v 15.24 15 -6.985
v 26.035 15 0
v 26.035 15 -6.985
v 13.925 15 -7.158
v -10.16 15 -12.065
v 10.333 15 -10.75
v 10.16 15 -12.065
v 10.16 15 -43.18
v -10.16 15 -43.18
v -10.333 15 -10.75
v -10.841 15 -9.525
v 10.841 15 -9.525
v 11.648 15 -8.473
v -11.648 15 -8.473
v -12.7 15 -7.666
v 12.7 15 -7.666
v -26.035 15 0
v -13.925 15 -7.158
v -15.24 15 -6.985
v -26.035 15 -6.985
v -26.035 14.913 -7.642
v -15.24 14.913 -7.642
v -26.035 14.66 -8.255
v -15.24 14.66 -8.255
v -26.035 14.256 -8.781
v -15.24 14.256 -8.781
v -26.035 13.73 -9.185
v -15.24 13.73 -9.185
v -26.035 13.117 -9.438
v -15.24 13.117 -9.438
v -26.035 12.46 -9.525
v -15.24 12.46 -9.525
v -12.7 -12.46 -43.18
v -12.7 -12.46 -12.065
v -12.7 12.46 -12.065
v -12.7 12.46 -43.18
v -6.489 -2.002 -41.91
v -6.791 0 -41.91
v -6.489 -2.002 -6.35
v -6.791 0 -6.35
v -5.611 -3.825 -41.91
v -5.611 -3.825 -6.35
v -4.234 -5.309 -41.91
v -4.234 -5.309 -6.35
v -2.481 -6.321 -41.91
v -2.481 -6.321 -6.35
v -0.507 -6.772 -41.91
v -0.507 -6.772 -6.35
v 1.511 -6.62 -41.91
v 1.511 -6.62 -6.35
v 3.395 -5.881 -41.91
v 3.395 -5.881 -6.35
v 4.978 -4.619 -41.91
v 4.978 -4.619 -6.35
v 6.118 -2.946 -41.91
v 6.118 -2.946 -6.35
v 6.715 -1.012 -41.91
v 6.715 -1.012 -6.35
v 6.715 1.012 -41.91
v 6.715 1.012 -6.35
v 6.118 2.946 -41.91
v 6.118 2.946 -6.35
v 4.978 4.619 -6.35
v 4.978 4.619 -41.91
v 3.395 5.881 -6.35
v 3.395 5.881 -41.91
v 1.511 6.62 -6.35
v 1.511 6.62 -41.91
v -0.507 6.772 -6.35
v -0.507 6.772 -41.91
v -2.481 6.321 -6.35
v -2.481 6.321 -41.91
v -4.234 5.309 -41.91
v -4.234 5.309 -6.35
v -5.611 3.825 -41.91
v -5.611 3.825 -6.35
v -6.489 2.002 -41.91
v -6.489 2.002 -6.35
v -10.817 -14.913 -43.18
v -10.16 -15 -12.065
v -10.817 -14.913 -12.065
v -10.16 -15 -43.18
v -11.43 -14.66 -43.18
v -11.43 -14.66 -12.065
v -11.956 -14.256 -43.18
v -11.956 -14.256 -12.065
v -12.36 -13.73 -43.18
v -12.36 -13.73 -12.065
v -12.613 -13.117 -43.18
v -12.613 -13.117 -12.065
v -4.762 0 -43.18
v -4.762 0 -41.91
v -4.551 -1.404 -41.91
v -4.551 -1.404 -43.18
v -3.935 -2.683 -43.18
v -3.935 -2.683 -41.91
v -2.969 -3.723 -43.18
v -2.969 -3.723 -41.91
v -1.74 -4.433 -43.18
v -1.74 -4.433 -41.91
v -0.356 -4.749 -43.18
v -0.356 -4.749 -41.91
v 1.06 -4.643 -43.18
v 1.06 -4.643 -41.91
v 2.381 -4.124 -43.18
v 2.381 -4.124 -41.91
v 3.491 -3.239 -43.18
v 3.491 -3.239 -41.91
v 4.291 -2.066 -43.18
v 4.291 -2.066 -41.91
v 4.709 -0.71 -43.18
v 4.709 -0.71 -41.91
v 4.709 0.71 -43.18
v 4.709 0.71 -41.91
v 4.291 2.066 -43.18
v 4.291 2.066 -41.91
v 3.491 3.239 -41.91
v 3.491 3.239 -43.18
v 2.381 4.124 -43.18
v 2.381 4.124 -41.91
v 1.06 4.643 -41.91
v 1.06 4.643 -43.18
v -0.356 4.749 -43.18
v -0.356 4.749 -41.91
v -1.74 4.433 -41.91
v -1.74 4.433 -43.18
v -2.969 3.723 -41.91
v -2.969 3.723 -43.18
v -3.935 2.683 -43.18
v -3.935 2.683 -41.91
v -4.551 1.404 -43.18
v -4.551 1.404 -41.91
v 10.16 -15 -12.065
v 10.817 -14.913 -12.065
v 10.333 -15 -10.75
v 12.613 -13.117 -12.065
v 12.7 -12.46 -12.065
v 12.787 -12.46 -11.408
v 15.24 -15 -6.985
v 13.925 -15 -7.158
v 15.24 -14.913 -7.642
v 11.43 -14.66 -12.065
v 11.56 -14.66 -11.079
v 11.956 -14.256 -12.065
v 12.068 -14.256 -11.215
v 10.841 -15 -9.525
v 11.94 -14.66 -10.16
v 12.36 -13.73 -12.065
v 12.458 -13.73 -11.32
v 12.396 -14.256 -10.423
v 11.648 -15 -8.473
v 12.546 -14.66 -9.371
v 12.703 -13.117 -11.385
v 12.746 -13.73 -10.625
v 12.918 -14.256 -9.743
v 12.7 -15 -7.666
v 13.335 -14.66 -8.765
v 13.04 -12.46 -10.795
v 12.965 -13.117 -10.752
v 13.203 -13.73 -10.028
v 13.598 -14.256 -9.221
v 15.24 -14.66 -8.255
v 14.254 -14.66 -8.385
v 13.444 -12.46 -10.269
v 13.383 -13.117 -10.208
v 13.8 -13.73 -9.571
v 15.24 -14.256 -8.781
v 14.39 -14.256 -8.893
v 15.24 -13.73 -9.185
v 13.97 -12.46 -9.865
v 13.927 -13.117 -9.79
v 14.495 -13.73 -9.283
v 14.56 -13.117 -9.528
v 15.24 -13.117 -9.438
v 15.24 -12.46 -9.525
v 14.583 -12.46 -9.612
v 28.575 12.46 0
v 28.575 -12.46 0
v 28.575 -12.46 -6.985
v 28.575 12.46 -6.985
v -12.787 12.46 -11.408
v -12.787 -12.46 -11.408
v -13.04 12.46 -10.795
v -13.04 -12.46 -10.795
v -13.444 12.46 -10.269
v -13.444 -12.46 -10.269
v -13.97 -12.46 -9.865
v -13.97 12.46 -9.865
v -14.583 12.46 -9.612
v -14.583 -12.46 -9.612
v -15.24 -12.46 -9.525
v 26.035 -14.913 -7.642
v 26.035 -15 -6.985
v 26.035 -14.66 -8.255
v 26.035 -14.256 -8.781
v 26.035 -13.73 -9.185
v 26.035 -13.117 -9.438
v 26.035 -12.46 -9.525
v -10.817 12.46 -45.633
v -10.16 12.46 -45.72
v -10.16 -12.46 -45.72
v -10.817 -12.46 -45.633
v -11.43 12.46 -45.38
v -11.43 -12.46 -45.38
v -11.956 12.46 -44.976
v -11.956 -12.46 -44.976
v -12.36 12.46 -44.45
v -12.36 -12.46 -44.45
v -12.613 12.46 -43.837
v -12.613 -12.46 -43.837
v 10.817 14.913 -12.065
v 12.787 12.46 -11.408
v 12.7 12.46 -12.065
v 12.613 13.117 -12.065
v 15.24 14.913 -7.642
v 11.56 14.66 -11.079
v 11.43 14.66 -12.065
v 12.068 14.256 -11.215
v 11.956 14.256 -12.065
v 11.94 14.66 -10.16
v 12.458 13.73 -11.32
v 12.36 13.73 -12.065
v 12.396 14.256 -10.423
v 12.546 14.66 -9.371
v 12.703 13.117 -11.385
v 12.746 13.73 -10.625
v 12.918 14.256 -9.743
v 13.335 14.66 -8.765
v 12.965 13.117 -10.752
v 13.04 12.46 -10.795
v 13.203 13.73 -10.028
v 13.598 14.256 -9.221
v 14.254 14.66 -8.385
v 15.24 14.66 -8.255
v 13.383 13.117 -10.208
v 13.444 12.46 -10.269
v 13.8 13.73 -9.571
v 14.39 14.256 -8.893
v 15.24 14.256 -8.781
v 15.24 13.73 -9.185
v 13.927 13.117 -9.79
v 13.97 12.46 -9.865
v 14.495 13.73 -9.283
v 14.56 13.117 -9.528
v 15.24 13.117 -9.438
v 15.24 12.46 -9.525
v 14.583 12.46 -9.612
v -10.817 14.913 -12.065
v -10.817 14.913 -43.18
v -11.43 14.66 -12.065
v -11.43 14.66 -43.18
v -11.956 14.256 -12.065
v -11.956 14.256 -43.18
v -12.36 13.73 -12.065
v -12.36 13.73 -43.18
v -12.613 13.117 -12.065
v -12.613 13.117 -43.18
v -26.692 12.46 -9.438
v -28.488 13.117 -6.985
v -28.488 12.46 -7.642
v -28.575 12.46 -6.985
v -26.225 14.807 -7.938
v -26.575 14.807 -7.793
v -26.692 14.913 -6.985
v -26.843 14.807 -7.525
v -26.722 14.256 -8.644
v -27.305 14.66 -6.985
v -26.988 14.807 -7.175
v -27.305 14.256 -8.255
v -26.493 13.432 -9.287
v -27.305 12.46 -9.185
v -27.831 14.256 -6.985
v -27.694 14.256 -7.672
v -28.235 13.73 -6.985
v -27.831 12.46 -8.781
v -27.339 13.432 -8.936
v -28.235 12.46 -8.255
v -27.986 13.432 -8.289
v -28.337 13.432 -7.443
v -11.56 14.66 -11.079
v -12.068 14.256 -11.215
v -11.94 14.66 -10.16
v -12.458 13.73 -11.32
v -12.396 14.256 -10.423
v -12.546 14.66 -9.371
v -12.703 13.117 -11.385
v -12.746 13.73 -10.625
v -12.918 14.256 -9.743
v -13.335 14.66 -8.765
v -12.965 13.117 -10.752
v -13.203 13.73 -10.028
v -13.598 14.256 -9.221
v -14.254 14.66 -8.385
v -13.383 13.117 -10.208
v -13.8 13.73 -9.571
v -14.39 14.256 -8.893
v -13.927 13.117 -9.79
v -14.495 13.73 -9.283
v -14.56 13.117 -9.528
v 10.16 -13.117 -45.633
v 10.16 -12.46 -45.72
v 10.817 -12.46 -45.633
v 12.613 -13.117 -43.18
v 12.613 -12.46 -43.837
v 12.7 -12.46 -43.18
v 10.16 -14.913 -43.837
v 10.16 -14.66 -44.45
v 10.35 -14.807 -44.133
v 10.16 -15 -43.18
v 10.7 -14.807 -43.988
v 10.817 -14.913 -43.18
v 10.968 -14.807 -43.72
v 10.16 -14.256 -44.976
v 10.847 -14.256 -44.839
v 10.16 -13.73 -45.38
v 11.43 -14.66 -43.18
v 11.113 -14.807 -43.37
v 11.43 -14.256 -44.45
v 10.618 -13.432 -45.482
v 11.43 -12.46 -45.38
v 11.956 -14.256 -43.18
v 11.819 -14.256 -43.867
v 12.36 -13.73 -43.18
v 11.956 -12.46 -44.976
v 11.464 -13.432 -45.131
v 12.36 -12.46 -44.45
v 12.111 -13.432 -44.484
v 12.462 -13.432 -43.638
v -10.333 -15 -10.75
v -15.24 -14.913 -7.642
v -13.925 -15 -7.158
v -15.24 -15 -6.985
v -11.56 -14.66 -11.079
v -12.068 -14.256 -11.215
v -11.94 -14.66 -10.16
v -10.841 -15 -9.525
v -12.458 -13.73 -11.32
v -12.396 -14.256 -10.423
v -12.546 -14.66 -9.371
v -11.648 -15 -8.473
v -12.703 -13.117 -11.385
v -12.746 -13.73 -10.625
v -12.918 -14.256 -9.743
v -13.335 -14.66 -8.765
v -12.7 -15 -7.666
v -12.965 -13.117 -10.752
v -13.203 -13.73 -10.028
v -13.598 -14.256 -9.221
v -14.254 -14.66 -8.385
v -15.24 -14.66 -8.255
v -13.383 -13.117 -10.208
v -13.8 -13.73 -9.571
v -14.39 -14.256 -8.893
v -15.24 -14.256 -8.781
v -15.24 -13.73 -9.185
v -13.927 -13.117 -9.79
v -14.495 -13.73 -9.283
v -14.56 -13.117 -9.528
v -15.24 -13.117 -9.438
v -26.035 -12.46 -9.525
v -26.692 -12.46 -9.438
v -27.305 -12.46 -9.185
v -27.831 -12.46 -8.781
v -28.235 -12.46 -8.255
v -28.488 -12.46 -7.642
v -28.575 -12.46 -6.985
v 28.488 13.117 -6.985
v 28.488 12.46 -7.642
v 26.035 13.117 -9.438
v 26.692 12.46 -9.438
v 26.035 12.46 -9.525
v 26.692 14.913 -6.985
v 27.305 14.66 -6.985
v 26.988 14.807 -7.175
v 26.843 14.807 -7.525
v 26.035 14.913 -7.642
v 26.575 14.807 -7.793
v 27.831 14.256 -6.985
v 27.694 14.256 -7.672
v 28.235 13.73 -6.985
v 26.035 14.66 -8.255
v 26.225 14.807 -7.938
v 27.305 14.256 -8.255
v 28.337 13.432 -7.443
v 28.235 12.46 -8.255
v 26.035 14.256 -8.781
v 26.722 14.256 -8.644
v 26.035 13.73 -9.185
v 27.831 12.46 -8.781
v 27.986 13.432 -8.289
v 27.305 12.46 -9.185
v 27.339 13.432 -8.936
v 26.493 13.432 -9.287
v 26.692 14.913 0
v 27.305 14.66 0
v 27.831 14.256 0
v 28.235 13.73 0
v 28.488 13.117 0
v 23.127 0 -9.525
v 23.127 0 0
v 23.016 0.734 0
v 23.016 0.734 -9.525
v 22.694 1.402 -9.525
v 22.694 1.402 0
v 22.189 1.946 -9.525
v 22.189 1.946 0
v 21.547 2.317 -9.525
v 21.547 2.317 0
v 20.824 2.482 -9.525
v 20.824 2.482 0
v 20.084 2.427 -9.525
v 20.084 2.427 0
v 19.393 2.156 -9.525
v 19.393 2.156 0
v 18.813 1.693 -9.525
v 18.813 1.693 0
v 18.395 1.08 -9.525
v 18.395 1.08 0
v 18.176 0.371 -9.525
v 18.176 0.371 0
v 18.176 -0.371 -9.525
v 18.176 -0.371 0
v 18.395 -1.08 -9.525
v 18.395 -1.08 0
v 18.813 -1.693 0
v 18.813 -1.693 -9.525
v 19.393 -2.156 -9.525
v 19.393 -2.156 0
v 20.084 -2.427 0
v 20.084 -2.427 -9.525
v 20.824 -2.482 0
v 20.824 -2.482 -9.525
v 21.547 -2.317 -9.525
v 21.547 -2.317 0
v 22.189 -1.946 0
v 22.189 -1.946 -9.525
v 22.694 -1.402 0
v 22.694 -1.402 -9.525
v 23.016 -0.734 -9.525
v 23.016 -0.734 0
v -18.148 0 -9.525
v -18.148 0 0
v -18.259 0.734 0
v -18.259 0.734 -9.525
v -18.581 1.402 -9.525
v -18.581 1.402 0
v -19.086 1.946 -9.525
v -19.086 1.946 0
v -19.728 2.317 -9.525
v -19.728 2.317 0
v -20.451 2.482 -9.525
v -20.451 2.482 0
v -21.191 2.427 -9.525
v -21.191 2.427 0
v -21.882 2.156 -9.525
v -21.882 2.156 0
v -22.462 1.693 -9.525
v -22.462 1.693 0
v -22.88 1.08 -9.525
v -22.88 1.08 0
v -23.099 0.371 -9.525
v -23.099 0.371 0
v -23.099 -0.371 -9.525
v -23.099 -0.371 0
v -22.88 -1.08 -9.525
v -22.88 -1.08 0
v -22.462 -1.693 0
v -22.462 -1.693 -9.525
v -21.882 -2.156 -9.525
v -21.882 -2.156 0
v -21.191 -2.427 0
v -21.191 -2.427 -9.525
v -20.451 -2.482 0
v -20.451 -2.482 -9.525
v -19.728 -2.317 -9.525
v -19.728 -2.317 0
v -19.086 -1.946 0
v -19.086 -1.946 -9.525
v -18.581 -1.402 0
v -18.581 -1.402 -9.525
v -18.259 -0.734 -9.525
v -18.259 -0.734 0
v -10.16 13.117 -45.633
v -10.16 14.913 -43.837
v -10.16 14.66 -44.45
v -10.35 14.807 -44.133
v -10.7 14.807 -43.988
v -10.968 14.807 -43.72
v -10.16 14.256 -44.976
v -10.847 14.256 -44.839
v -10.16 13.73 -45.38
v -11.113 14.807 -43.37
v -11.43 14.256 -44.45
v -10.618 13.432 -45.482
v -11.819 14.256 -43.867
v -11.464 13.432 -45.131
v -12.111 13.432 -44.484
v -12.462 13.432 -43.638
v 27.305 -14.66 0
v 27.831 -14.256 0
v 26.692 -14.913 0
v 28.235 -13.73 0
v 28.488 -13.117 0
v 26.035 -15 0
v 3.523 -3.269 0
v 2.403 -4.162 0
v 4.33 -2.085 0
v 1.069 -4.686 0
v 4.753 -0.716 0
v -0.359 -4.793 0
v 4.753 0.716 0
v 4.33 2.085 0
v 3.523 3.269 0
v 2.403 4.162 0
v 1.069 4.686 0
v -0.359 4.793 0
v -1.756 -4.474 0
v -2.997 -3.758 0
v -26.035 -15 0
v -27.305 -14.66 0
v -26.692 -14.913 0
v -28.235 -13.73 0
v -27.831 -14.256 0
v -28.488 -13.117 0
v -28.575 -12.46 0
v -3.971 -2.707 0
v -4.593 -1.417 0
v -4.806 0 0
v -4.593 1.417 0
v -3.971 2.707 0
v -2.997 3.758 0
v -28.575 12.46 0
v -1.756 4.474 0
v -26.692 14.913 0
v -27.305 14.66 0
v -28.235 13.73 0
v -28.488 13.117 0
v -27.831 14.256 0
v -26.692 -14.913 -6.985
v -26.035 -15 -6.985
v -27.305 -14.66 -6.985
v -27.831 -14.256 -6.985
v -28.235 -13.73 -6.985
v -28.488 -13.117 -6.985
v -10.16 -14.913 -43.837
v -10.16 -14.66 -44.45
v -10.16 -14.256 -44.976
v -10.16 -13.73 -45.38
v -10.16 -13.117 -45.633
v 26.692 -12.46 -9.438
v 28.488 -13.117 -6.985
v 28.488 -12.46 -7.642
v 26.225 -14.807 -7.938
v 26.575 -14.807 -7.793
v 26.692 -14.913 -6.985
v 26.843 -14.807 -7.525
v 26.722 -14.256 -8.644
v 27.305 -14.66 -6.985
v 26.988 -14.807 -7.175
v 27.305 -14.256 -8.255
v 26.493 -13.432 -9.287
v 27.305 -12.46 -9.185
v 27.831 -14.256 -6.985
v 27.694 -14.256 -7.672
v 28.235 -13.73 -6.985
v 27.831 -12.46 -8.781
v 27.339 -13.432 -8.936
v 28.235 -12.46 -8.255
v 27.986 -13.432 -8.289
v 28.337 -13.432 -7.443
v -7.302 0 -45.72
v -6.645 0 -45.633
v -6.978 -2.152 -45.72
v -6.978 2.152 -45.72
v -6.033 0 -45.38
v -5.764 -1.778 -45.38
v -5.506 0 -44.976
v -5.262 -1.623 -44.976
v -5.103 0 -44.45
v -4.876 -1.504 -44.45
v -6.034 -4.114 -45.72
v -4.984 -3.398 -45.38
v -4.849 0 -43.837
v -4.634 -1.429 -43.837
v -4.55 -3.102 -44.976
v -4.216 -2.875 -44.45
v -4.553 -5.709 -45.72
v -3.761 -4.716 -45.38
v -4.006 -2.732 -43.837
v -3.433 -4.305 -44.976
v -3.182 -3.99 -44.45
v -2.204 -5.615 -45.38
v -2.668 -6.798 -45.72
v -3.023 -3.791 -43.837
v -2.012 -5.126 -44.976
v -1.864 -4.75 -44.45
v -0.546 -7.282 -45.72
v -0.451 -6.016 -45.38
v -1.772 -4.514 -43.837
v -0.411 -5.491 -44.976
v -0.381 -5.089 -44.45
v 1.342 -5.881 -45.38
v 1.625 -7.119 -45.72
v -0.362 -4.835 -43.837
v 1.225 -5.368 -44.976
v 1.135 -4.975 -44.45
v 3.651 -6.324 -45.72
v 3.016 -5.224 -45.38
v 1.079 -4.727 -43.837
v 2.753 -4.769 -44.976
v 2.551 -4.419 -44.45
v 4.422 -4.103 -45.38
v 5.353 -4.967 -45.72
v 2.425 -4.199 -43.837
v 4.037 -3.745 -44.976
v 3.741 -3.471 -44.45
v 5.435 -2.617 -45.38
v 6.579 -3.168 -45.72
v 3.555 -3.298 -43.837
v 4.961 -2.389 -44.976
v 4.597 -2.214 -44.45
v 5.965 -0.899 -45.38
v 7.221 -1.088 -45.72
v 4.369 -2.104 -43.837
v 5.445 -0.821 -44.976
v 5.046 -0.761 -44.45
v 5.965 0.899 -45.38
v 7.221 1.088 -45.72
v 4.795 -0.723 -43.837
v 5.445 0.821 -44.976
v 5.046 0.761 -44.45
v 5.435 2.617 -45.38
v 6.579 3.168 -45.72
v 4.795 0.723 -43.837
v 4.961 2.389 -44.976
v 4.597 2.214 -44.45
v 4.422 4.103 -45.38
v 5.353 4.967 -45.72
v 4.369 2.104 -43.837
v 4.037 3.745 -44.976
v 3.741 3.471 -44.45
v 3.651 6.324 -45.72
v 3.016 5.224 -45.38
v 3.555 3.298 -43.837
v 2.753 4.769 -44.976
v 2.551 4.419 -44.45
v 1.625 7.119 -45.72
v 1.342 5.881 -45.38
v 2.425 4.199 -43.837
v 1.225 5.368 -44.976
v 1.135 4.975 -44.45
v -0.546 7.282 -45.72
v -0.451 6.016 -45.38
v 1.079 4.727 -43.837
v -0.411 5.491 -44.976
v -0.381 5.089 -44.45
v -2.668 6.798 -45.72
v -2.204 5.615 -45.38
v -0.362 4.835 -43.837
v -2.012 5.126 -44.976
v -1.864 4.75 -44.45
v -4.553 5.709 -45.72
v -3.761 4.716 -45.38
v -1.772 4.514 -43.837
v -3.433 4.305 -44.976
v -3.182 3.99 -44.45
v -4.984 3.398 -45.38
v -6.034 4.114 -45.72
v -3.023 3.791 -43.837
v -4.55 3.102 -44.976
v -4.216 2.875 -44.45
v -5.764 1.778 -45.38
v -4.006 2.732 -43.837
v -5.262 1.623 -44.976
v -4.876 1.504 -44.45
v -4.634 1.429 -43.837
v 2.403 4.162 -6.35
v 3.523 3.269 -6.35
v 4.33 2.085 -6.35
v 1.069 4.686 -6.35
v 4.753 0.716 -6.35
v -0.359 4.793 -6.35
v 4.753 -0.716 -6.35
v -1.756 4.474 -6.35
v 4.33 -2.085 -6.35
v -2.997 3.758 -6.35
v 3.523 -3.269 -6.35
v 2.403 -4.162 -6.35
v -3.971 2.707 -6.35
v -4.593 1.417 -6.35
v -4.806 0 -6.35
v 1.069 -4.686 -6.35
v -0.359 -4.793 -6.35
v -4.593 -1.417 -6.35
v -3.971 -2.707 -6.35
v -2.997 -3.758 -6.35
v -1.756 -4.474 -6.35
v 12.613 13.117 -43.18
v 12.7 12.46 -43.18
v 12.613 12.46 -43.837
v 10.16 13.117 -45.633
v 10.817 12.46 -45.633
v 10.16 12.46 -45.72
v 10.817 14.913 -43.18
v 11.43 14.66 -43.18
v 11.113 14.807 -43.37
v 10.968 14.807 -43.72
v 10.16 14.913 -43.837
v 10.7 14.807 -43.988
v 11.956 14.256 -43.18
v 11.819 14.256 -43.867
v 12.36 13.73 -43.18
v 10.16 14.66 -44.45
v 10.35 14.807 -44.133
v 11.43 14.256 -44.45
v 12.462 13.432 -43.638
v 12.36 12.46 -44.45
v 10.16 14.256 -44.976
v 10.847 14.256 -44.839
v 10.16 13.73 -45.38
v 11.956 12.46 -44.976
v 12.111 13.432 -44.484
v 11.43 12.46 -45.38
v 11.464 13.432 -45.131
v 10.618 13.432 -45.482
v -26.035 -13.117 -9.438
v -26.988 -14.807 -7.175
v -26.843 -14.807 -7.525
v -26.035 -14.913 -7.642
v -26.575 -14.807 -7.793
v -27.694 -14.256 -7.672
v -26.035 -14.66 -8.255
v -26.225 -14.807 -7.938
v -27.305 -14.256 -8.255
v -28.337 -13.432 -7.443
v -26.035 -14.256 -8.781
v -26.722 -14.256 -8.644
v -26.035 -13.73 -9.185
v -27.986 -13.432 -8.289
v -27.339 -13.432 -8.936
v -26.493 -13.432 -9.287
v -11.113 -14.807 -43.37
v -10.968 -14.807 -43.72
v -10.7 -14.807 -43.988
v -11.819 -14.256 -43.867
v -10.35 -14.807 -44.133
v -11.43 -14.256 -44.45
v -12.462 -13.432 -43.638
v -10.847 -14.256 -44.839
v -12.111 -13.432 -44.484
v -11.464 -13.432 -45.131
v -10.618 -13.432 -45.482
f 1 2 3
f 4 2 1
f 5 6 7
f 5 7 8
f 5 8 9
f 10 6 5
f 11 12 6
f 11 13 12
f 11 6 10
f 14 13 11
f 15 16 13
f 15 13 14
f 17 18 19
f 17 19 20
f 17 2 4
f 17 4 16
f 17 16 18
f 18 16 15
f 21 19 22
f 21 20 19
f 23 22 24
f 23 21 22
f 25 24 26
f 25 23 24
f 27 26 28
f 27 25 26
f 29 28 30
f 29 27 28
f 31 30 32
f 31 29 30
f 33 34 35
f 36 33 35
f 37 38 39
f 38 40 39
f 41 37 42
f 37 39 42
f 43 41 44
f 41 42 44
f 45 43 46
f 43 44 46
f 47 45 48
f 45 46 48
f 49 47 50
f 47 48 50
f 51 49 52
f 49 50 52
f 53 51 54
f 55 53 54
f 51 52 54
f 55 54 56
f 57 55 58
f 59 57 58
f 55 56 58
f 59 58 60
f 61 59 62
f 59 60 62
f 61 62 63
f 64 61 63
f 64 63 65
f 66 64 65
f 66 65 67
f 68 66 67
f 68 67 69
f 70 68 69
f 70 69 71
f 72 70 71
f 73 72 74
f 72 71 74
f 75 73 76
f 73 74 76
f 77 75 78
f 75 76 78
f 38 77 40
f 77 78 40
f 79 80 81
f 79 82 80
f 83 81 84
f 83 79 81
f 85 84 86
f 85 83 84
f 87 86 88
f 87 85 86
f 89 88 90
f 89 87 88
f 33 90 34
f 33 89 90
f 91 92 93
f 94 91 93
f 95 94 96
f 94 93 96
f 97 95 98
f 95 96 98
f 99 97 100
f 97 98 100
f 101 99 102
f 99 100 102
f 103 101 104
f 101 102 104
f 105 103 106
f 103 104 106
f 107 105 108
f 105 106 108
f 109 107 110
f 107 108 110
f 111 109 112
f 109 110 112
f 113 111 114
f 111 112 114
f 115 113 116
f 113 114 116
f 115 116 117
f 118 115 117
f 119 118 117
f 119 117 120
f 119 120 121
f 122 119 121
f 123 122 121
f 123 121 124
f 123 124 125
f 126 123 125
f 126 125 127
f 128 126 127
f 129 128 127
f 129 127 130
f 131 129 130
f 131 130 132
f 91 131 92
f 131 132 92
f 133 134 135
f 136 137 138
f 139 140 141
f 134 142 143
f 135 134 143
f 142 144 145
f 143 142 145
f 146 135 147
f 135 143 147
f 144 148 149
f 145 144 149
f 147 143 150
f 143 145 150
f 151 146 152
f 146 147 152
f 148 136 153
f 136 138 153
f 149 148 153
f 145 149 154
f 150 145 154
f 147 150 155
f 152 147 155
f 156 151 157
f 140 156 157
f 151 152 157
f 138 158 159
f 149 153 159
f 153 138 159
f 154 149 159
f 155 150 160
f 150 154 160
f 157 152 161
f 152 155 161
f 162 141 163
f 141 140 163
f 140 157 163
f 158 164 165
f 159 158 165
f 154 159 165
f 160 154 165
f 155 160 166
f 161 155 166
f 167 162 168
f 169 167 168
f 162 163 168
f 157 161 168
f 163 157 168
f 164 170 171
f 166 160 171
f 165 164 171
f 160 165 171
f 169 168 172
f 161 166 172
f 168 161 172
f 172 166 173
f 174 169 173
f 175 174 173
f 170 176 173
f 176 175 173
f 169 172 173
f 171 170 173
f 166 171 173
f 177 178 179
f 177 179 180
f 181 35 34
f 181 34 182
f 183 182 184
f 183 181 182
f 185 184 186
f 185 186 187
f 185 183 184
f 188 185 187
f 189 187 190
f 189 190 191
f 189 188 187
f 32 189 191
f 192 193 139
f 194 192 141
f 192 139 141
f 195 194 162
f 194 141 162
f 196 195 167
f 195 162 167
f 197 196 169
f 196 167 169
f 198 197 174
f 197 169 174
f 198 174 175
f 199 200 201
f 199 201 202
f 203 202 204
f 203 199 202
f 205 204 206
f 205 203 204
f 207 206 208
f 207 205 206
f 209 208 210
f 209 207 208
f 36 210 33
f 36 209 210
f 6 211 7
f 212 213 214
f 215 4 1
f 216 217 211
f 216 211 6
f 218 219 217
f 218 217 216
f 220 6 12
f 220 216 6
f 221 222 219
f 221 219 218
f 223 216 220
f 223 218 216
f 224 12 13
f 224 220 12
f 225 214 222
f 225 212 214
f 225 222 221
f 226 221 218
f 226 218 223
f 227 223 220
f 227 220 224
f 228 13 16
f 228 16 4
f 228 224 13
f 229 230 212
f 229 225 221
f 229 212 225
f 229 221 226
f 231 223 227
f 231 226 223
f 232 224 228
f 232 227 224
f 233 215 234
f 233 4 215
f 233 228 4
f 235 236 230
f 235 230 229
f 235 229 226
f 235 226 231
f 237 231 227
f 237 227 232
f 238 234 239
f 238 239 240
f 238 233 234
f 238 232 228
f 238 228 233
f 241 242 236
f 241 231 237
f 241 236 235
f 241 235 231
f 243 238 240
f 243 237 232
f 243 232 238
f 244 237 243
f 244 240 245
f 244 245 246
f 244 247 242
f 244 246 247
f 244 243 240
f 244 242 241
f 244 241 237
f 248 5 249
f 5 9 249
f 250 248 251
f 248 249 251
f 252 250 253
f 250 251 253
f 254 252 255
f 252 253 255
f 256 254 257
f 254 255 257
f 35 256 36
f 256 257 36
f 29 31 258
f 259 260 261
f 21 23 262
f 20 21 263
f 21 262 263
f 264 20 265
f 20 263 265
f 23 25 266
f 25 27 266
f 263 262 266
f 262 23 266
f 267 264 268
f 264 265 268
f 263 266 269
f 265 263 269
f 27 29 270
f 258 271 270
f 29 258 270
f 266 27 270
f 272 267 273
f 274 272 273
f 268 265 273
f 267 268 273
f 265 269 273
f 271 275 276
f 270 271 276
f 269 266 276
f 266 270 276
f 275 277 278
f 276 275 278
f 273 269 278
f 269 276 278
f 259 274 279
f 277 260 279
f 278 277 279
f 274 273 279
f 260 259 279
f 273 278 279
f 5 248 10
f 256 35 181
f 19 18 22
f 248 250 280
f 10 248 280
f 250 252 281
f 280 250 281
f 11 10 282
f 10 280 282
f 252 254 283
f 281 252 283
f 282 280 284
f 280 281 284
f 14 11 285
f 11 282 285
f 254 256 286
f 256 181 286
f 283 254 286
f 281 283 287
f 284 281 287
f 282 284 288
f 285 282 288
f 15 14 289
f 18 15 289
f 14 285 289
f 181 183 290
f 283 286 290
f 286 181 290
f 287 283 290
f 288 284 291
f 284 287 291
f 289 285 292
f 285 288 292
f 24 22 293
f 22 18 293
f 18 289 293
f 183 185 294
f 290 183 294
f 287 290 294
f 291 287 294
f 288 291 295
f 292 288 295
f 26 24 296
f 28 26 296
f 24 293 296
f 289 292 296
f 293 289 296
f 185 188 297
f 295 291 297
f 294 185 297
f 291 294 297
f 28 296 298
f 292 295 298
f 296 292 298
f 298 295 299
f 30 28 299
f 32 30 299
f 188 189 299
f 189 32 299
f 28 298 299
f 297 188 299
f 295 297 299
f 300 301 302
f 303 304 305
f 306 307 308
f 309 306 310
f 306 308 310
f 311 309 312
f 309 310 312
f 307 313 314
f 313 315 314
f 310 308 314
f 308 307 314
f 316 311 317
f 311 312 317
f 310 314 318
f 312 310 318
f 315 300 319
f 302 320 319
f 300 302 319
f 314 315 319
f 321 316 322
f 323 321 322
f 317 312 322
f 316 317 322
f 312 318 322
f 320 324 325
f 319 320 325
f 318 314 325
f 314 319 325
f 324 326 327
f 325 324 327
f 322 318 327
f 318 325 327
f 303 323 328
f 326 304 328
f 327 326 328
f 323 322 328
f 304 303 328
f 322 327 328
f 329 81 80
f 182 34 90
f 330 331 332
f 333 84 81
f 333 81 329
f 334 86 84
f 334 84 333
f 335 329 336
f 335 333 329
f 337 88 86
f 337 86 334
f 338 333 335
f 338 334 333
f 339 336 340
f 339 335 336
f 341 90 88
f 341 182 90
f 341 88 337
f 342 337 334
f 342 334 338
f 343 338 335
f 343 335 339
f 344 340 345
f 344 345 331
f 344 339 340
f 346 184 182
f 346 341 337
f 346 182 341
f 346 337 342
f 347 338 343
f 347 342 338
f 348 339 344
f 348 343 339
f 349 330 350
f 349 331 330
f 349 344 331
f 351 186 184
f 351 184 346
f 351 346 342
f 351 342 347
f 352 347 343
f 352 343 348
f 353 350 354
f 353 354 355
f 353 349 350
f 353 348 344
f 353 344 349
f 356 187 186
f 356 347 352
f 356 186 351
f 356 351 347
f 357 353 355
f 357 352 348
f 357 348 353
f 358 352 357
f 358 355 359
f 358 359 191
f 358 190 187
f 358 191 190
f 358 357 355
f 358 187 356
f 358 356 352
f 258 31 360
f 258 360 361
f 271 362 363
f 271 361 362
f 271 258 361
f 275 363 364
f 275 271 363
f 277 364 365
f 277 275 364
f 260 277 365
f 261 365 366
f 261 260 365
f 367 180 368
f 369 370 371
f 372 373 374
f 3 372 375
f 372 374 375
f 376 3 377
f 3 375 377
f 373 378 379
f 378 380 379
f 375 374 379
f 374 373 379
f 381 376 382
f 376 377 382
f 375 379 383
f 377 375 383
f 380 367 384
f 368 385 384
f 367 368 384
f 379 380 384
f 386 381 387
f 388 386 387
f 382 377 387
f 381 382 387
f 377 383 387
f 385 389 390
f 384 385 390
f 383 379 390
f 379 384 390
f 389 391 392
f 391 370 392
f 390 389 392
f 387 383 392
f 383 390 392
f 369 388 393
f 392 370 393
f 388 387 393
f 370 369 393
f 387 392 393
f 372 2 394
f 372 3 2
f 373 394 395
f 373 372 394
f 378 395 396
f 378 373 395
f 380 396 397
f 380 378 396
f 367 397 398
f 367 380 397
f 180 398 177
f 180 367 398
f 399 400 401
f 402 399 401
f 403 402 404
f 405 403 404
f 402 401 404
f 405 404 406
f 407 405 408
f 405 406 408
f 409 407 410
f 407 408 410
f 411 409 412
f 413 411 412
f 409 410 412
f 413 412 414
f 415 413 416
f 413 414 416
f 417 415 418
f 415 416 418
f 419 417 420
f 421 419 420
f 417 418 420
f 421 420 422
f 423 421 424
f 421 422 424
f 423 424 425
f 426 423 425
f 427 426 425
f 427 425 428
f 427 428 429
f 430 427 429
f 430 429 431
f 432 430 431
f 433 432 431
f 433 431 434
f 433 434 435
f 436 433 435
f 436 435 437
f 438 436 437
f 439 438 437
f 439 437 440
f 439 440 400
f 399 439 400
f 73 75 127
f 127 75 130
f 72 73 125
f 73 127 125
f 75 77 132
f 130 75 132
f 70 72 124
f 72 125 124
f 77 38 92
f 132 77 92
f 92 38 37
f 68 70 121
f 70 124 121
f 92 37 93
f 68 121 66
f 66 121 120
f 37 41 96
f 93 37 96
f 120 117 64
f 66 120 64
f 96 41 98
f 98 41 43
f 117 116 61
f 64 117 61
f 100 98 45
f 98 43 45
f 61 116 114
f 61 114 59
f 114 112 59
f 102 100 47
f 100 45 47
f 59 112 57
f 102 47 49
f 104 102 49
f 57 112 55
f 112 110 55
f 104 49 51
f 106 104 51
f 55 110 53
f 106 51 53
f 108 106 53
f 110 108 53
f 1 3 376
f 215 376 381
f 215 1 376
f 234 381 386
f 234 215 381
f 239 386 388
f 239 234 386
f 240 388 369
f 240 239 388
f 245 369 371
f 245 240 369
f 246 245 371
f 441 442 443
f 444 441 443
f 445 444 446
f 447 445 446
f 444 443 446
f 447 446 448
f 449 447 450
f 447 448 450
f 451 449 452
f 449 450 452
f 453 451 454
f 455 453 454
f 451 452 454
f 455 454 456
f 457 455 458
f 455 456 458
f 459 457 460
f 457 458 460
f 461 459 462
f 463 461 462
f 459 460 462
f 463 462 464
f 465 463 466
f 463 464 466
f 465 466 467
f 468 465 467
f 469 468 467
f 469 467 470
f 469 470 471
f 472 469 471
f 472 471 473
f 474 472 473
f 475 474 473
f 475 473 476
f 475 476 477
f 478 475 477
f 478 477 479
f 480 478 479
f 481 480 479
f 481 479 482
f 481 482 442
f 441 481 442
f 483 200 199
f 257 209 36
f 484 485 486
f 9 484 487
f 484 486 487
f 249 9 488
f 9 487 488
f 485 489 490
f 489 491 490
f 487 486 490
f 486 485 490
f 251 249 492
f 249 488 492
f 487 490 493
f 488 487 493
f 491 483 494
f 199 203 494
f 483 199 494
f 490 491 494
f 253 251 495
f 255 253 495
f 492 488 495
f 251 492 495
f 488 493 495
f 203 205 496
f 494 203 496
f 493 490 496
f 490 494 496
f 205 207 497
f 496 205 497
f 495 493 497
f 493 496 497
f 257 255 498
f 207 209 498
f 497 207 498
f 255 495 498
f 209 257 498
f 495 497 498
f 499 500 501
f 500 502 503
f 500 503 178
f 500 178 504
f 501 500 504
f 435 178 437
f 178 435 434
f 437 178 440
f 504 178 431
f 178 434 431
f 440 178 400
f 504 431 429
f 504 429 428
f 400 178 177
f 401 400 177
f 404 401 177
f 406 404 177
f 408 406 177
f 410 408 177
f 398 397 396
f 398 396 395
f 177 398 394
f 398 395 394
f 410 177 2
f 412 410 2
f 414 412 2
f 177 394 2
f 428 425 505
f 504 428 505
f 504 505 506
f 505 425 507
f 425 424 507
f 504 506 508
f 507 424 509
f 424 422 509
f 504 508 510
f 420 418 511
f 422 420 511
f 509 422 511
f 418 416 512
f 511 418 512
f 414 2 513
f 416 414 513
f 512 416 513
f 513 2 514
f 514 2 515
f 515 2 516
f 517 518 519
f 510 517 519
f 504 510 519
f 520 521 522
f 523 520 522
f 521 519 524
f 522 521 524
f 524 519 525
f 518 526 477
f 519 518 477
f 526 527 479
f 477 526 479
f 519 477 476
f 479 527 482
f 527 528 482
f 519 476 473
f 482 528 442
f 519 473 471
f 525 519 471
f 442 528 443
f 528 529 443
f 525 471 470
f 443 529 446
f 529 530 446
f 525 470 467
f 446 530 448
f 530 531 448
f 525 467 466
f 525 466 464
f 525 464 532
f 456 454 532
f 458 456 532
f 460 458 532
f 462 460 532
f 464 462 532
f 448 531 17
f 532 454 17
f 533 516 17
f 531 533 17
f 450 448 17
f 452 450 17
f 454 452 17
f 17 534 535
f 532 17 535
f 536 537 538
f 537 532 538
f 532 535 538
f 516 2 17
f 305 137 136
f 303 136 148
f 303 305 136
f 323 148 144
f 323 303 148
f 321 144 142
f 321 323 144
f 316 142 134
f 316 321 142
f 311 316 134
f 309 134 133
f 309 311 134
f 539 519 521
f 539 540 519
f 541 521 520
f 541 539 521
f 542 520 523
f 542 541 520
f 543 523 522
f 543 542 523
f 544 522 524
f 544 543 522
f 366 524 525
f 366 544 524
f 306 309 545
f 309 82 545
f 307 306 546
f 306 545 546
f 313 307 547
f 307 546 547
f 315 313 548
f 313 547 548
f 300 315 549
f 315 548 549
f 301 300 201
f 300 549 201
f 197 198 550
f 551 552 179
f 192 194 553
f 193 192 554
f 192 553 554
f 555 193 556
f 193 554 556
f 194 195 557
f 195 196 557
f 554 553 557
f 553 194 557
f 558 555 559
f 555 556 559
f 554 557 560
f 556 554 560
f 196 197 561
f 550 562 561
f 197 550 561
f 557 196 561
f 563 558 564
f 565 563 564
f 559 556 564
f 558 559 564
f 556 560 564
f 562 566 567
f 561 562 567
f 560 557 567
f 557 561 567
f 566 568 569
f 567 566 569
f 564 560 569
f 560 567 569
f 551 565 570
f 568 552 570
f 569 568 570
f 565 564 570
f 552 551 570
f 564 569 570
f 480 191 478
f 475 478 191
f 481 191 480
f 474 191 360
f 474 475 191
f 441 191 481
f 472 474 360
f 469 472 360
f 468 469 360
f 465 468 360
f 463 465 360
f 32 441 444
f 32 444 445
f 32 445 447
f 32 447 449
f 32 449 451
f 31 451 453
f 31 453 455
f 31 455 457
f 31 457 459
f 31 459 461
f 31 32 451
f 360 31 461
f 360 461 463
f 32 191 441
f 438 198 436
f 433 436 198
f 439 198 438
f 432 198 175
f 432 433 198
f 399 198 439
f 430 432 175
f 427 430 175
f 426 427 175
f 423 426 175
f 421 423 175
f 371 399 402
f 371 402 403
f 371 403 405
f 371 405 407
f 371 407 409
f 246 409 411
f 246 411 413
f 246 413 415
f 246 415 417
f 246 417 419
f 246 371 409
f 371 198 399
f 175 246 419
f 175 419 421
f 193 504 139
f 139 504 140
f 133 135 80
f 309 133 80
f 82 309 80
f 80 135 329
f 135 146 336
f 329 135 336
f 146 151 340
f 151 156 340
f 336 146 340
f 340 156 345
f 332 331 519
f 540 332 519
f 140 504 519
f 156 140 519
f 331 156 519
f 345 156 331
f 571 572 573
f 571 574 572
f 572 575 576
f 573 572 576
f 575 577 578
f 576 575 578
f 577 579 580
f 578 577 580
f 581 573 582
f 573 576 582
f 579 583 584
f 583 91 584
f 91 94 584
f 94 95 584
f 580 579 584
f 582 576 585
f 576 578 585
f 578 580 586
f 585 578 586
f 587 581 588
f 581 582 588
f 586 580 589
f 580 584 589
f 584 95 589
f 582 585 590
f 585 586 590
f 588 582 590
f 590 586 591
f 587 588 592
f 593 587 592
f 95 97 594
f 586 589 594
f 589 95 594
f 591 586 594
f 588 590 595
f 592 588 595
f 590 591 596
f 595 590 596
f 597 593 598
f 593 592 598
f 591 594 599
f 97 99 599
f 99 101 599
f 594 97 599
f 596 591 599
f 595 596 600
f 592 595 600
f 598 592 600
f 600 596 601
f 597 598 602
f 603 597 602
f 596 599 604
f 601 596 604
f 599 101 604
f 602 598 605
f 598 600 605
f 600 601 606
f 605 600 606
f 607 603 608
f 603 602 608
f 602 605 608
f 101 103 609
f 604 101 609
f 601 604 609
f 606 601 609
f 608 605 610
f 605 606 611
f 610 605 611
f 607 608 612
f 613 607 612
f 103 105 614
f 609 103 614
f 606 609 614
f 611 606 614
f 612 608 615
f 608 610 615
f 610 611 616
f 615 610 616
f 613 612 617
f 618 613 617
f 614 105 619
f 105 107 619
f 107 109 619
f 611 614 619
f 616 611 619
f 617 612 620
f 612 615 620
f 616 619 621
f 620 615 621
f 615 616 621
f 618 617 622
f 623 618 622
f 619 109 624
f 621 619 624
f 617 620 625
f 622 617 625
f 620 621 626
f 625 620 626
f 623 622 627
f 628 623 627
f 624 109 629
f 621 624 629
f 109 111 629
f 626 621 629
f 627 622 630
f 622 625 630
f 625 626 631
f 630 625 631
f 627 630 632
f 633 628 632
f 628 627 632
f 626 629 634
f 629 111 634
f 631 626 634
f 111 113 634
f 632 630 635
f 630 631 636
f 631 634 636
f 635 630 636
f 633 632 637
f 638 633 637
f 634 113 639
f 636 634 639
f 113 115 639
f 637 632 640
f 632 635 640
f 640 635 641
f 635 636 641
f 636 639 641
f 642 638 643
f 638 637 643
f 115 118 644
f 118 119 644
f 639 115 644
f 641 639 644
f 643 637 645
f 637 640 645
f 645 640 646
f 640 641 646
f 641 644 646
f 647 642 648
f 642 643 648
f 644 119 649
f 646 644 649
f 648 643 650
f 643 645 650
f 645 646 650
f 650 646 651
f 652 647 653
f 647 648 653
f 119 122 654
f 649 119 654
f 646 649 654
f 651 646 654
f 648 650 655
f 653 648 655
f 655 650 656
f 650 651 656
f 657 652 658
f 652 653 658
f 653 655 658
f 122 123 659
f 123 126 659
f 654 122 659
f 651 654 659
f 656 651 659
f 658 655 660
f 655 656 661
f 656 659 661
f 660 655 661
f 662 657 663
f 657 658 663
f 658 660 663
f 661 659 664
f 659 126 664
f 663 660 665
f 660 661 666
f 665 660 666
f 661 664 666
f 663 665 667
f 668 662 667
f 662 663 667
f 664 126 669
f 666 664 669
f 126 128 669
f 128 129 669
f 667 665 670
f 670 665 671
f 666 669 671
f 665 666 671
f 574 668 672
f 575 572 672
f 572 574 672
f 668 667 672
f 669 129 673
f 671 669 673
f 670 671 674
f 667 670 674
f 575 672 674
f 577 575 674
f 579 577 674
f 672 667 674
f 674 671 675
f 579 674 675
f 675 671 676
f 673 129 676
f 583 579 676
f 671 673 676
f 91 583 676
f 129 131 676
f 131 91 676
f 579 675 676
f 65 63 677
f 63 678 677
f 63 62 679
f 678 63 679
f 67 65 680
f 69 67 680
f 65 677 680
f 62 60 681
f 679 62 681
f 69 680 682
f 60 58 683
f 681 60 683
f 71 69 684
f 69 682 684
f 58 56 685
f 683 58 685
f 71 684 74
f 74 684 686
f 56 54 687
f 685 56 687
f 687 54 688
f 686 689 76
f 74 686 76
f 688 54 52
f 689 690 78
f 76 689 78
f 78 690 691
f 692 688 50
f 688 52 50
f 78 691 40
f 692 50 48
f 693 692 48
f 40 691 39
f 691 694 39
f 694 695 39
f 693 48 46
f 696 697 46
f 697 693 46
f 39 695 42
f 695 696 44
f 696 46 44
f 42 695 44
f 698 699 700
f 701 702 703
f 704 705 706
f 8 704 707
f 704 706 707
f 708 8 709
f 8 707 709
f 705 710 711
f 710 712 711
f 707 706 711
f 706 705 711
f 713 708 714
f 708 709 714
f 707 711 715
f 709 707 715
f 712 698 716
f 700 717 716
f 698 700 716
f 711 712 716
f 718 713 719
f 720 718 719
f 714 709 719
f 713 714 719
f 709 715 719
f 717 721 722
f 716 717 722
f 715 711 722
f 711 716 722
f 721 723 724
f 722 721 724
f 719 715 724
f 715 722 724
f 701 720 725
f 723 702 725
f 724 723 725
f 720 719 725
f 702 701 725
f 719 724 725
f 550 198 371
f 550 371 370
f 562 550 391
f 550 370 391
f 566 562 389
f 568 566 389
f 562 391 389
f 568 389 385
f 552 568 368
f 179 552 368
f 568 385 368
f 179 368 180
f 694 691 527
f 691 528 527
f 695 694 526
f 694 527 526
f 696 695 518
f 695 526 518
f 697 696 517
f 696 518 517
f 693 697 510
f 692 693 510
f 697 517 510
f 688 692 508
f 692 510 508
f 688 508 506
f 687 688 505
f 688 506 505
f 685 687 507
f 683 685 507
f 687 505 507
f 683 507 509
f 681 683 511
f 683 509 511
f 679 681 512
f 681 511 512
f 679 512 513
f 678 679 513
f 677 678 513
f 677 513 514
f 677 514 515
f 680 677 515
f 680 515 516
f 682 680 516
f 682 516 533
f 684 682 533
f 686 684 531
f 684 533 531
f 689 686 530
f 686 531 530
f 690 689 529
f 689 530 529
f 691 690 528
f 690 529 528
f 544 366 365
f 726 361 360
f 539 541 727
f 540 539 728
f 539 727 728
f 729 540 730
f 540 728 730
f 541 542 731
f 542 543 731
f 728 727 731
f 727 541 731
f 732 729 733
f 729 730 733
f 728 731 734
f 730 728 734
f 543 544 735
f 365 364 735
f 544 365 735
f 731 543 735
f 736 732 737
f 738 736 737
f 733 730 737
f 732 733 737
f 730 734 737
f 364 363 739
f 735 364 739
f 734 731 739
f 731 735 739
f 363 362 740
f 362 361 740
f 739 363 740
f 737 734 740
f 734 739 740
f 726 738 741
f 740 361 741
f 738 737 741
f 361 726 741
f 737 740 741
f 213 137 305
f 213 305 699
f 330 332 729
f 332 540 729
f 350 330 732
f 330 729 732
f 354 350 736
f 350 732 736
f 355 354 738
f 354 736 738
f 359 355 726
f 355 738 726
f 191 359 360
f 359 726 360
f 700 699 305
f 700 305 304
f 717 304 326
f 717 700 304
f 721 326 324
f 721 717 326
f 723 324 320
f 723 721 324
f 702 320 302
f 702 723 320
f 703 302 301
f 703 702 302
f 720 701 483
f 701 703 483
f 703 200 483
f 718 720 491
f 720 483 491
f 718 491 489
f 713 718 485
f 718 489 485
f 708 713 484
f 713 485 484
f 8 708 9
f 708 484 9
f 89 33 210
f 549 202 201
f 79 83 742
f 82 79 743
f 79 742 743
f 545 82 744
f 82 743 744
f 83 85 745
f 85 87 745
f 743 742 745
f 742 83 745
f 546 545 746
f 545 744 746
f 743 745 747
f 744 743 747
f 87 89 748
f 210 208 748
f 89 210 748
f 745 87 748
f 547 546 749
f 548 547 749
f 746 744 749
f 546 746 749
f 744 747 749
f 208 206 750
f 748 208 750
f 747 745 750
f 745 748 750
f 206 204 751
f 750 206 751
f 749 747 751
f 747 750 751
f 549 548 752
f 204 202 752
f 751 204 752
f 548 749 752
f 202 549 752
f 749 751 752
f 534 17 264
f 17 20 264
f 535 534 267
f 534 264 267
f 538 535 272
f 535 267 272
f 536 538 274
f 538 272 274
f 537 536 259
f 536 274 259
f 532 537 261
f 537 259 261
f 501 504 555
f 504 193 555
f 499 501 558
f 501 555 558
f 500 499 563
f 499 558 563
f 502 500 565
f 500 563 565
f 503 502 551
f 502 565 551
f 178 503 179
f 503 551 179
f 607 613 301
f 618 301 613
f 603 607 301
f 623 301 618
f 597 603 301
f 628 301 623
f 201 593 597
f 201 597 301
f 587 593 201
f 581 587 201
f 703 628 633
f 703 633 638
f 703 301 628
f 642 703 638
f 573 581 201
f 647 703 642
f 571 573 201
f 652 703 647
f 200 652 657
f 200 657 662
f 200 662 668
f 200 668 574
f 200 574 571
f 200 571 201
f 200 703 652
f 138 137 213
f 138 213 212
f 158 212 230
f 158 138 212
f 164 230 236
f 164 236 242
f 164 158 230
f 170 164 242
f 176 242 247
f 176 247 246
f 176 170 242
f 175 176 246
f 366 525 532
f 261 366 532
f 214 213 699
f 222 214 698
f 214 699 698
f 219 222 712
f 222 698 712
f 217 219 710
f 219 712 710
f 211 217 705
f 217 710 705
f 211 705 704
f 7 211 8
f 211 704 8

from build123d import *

# Parameters (mm, degrees)
SKETCH3_W              = 57.15
SKETCH3_H              = 30
SKETCH3_R              = 12.7
BOSS_EXTRUDE1_DEPTH    = 9.525
SKETCH6_W              = 25.4
SKETCH6_H              = 30
SKETCH6_R              = 11.684
BOSS_EXTRUDE2_DEPTH    = 36.195
F_10_CLEARANCE_HOLE1_D = 4.9784
FILLET2_R              = 2.54


with BuildPart() as part:
    # Sketch1 → Revolve1 (revolve)
    with BuildSketch(Plane(origin=(0, 0, 0), x_dir=(1, 0, 0), z_dir=(0, 1, 0)), mode=Mode.PRIVATE) as revolve1_sk:
        Polygon((4.80625, 6.35), (4.80625, 0), (12.7, 0), (12.7, 45.72), (4.7625, 45.72), (4.7625, 41.91), (6.790625, 41.91), (6.790625, 6.35), align=None)
    revolve(revolve1_sk.sketch.rotate(Axis((0, 0, 0), (0, 0, 1)), 180), axis=Axis((0, 0, 0), (0, 0, 1)))  # turned: the seam where the file's is

    # Sketch3 → Boss-Extrude1 (add)
    with BuildSketch(Plane(origin=(0, 0, 0), x_dir=(-1, 0, 0), z_dir=(0, 0, -1))):
        Rectangle(SKETCH3_W, SKETCH3_H)
        Circle(SKETCH3_R, mode=Mode.SUBTRACT)
    extrude(amount=BOSS_EXTRUDE1_DEPTH)

    # Sketch6 → Boss-Extrude2 (add)
    with BuildSketch(Plane(origin=(0, 0, -9.525), x_dir=(-1, 0, 0), z_dir=(0, 0, -1))):
        Rectangle(SKETCH6_W, SKETCH6_H)
        Circle(SKETCH6_R, mode=Mode.SUBTRACT)
    extrude(amount=BOSS_EXTRUDE2_DEPTH)

    # #10 Clearance Hole1 (through all)
    with Locations(Plane(origin=(0, 0, -9.525), x_dir=(-1, 0, 0), z_dir=(0, 0, -1))):
        with Locations((20.6375, 0), (-20.6375, 0)):
            Hole(F_10_CLEARANCE_HOLE1_D / 2)

    # Fillet2
    fillet2_edges = [part.edges().sort_by_distance(p)[0] for p in [
        (28.575, 0, -9.525),
        (20.6375, -15, -9.525),
        (-28.575, 0, -9.525),
        (-20.6375, 15, -9.525),
        (28.575, 15, -4.7625),
        (28.575, -15, -4.7625),
        (-28.575, -15, -4.7625),
        (-28.575, 15, -4.7625),
        (20.6375, 15, -9.525),
        (-20.6375, -15, -9.525),
        (12.7, 0, -9.525),
        (12.7, 0, -45.72),
        (12.7, 15, -27.6225),
        (-12.7, 0, -9.525),
        (-12.7, 0, -45.72),
        (-12.7, -15, -27.6225),
        (0, -15, -45.72),
        (12.7, -15, -27.6225),
        (0, 15, -45.72),
        (-12.7, 15, -27.6225),
        (4.7625, 0, -45.72),
    ]]
    fillet(fillet2_edges, radius=FILLET2_R)


solid = part.part
